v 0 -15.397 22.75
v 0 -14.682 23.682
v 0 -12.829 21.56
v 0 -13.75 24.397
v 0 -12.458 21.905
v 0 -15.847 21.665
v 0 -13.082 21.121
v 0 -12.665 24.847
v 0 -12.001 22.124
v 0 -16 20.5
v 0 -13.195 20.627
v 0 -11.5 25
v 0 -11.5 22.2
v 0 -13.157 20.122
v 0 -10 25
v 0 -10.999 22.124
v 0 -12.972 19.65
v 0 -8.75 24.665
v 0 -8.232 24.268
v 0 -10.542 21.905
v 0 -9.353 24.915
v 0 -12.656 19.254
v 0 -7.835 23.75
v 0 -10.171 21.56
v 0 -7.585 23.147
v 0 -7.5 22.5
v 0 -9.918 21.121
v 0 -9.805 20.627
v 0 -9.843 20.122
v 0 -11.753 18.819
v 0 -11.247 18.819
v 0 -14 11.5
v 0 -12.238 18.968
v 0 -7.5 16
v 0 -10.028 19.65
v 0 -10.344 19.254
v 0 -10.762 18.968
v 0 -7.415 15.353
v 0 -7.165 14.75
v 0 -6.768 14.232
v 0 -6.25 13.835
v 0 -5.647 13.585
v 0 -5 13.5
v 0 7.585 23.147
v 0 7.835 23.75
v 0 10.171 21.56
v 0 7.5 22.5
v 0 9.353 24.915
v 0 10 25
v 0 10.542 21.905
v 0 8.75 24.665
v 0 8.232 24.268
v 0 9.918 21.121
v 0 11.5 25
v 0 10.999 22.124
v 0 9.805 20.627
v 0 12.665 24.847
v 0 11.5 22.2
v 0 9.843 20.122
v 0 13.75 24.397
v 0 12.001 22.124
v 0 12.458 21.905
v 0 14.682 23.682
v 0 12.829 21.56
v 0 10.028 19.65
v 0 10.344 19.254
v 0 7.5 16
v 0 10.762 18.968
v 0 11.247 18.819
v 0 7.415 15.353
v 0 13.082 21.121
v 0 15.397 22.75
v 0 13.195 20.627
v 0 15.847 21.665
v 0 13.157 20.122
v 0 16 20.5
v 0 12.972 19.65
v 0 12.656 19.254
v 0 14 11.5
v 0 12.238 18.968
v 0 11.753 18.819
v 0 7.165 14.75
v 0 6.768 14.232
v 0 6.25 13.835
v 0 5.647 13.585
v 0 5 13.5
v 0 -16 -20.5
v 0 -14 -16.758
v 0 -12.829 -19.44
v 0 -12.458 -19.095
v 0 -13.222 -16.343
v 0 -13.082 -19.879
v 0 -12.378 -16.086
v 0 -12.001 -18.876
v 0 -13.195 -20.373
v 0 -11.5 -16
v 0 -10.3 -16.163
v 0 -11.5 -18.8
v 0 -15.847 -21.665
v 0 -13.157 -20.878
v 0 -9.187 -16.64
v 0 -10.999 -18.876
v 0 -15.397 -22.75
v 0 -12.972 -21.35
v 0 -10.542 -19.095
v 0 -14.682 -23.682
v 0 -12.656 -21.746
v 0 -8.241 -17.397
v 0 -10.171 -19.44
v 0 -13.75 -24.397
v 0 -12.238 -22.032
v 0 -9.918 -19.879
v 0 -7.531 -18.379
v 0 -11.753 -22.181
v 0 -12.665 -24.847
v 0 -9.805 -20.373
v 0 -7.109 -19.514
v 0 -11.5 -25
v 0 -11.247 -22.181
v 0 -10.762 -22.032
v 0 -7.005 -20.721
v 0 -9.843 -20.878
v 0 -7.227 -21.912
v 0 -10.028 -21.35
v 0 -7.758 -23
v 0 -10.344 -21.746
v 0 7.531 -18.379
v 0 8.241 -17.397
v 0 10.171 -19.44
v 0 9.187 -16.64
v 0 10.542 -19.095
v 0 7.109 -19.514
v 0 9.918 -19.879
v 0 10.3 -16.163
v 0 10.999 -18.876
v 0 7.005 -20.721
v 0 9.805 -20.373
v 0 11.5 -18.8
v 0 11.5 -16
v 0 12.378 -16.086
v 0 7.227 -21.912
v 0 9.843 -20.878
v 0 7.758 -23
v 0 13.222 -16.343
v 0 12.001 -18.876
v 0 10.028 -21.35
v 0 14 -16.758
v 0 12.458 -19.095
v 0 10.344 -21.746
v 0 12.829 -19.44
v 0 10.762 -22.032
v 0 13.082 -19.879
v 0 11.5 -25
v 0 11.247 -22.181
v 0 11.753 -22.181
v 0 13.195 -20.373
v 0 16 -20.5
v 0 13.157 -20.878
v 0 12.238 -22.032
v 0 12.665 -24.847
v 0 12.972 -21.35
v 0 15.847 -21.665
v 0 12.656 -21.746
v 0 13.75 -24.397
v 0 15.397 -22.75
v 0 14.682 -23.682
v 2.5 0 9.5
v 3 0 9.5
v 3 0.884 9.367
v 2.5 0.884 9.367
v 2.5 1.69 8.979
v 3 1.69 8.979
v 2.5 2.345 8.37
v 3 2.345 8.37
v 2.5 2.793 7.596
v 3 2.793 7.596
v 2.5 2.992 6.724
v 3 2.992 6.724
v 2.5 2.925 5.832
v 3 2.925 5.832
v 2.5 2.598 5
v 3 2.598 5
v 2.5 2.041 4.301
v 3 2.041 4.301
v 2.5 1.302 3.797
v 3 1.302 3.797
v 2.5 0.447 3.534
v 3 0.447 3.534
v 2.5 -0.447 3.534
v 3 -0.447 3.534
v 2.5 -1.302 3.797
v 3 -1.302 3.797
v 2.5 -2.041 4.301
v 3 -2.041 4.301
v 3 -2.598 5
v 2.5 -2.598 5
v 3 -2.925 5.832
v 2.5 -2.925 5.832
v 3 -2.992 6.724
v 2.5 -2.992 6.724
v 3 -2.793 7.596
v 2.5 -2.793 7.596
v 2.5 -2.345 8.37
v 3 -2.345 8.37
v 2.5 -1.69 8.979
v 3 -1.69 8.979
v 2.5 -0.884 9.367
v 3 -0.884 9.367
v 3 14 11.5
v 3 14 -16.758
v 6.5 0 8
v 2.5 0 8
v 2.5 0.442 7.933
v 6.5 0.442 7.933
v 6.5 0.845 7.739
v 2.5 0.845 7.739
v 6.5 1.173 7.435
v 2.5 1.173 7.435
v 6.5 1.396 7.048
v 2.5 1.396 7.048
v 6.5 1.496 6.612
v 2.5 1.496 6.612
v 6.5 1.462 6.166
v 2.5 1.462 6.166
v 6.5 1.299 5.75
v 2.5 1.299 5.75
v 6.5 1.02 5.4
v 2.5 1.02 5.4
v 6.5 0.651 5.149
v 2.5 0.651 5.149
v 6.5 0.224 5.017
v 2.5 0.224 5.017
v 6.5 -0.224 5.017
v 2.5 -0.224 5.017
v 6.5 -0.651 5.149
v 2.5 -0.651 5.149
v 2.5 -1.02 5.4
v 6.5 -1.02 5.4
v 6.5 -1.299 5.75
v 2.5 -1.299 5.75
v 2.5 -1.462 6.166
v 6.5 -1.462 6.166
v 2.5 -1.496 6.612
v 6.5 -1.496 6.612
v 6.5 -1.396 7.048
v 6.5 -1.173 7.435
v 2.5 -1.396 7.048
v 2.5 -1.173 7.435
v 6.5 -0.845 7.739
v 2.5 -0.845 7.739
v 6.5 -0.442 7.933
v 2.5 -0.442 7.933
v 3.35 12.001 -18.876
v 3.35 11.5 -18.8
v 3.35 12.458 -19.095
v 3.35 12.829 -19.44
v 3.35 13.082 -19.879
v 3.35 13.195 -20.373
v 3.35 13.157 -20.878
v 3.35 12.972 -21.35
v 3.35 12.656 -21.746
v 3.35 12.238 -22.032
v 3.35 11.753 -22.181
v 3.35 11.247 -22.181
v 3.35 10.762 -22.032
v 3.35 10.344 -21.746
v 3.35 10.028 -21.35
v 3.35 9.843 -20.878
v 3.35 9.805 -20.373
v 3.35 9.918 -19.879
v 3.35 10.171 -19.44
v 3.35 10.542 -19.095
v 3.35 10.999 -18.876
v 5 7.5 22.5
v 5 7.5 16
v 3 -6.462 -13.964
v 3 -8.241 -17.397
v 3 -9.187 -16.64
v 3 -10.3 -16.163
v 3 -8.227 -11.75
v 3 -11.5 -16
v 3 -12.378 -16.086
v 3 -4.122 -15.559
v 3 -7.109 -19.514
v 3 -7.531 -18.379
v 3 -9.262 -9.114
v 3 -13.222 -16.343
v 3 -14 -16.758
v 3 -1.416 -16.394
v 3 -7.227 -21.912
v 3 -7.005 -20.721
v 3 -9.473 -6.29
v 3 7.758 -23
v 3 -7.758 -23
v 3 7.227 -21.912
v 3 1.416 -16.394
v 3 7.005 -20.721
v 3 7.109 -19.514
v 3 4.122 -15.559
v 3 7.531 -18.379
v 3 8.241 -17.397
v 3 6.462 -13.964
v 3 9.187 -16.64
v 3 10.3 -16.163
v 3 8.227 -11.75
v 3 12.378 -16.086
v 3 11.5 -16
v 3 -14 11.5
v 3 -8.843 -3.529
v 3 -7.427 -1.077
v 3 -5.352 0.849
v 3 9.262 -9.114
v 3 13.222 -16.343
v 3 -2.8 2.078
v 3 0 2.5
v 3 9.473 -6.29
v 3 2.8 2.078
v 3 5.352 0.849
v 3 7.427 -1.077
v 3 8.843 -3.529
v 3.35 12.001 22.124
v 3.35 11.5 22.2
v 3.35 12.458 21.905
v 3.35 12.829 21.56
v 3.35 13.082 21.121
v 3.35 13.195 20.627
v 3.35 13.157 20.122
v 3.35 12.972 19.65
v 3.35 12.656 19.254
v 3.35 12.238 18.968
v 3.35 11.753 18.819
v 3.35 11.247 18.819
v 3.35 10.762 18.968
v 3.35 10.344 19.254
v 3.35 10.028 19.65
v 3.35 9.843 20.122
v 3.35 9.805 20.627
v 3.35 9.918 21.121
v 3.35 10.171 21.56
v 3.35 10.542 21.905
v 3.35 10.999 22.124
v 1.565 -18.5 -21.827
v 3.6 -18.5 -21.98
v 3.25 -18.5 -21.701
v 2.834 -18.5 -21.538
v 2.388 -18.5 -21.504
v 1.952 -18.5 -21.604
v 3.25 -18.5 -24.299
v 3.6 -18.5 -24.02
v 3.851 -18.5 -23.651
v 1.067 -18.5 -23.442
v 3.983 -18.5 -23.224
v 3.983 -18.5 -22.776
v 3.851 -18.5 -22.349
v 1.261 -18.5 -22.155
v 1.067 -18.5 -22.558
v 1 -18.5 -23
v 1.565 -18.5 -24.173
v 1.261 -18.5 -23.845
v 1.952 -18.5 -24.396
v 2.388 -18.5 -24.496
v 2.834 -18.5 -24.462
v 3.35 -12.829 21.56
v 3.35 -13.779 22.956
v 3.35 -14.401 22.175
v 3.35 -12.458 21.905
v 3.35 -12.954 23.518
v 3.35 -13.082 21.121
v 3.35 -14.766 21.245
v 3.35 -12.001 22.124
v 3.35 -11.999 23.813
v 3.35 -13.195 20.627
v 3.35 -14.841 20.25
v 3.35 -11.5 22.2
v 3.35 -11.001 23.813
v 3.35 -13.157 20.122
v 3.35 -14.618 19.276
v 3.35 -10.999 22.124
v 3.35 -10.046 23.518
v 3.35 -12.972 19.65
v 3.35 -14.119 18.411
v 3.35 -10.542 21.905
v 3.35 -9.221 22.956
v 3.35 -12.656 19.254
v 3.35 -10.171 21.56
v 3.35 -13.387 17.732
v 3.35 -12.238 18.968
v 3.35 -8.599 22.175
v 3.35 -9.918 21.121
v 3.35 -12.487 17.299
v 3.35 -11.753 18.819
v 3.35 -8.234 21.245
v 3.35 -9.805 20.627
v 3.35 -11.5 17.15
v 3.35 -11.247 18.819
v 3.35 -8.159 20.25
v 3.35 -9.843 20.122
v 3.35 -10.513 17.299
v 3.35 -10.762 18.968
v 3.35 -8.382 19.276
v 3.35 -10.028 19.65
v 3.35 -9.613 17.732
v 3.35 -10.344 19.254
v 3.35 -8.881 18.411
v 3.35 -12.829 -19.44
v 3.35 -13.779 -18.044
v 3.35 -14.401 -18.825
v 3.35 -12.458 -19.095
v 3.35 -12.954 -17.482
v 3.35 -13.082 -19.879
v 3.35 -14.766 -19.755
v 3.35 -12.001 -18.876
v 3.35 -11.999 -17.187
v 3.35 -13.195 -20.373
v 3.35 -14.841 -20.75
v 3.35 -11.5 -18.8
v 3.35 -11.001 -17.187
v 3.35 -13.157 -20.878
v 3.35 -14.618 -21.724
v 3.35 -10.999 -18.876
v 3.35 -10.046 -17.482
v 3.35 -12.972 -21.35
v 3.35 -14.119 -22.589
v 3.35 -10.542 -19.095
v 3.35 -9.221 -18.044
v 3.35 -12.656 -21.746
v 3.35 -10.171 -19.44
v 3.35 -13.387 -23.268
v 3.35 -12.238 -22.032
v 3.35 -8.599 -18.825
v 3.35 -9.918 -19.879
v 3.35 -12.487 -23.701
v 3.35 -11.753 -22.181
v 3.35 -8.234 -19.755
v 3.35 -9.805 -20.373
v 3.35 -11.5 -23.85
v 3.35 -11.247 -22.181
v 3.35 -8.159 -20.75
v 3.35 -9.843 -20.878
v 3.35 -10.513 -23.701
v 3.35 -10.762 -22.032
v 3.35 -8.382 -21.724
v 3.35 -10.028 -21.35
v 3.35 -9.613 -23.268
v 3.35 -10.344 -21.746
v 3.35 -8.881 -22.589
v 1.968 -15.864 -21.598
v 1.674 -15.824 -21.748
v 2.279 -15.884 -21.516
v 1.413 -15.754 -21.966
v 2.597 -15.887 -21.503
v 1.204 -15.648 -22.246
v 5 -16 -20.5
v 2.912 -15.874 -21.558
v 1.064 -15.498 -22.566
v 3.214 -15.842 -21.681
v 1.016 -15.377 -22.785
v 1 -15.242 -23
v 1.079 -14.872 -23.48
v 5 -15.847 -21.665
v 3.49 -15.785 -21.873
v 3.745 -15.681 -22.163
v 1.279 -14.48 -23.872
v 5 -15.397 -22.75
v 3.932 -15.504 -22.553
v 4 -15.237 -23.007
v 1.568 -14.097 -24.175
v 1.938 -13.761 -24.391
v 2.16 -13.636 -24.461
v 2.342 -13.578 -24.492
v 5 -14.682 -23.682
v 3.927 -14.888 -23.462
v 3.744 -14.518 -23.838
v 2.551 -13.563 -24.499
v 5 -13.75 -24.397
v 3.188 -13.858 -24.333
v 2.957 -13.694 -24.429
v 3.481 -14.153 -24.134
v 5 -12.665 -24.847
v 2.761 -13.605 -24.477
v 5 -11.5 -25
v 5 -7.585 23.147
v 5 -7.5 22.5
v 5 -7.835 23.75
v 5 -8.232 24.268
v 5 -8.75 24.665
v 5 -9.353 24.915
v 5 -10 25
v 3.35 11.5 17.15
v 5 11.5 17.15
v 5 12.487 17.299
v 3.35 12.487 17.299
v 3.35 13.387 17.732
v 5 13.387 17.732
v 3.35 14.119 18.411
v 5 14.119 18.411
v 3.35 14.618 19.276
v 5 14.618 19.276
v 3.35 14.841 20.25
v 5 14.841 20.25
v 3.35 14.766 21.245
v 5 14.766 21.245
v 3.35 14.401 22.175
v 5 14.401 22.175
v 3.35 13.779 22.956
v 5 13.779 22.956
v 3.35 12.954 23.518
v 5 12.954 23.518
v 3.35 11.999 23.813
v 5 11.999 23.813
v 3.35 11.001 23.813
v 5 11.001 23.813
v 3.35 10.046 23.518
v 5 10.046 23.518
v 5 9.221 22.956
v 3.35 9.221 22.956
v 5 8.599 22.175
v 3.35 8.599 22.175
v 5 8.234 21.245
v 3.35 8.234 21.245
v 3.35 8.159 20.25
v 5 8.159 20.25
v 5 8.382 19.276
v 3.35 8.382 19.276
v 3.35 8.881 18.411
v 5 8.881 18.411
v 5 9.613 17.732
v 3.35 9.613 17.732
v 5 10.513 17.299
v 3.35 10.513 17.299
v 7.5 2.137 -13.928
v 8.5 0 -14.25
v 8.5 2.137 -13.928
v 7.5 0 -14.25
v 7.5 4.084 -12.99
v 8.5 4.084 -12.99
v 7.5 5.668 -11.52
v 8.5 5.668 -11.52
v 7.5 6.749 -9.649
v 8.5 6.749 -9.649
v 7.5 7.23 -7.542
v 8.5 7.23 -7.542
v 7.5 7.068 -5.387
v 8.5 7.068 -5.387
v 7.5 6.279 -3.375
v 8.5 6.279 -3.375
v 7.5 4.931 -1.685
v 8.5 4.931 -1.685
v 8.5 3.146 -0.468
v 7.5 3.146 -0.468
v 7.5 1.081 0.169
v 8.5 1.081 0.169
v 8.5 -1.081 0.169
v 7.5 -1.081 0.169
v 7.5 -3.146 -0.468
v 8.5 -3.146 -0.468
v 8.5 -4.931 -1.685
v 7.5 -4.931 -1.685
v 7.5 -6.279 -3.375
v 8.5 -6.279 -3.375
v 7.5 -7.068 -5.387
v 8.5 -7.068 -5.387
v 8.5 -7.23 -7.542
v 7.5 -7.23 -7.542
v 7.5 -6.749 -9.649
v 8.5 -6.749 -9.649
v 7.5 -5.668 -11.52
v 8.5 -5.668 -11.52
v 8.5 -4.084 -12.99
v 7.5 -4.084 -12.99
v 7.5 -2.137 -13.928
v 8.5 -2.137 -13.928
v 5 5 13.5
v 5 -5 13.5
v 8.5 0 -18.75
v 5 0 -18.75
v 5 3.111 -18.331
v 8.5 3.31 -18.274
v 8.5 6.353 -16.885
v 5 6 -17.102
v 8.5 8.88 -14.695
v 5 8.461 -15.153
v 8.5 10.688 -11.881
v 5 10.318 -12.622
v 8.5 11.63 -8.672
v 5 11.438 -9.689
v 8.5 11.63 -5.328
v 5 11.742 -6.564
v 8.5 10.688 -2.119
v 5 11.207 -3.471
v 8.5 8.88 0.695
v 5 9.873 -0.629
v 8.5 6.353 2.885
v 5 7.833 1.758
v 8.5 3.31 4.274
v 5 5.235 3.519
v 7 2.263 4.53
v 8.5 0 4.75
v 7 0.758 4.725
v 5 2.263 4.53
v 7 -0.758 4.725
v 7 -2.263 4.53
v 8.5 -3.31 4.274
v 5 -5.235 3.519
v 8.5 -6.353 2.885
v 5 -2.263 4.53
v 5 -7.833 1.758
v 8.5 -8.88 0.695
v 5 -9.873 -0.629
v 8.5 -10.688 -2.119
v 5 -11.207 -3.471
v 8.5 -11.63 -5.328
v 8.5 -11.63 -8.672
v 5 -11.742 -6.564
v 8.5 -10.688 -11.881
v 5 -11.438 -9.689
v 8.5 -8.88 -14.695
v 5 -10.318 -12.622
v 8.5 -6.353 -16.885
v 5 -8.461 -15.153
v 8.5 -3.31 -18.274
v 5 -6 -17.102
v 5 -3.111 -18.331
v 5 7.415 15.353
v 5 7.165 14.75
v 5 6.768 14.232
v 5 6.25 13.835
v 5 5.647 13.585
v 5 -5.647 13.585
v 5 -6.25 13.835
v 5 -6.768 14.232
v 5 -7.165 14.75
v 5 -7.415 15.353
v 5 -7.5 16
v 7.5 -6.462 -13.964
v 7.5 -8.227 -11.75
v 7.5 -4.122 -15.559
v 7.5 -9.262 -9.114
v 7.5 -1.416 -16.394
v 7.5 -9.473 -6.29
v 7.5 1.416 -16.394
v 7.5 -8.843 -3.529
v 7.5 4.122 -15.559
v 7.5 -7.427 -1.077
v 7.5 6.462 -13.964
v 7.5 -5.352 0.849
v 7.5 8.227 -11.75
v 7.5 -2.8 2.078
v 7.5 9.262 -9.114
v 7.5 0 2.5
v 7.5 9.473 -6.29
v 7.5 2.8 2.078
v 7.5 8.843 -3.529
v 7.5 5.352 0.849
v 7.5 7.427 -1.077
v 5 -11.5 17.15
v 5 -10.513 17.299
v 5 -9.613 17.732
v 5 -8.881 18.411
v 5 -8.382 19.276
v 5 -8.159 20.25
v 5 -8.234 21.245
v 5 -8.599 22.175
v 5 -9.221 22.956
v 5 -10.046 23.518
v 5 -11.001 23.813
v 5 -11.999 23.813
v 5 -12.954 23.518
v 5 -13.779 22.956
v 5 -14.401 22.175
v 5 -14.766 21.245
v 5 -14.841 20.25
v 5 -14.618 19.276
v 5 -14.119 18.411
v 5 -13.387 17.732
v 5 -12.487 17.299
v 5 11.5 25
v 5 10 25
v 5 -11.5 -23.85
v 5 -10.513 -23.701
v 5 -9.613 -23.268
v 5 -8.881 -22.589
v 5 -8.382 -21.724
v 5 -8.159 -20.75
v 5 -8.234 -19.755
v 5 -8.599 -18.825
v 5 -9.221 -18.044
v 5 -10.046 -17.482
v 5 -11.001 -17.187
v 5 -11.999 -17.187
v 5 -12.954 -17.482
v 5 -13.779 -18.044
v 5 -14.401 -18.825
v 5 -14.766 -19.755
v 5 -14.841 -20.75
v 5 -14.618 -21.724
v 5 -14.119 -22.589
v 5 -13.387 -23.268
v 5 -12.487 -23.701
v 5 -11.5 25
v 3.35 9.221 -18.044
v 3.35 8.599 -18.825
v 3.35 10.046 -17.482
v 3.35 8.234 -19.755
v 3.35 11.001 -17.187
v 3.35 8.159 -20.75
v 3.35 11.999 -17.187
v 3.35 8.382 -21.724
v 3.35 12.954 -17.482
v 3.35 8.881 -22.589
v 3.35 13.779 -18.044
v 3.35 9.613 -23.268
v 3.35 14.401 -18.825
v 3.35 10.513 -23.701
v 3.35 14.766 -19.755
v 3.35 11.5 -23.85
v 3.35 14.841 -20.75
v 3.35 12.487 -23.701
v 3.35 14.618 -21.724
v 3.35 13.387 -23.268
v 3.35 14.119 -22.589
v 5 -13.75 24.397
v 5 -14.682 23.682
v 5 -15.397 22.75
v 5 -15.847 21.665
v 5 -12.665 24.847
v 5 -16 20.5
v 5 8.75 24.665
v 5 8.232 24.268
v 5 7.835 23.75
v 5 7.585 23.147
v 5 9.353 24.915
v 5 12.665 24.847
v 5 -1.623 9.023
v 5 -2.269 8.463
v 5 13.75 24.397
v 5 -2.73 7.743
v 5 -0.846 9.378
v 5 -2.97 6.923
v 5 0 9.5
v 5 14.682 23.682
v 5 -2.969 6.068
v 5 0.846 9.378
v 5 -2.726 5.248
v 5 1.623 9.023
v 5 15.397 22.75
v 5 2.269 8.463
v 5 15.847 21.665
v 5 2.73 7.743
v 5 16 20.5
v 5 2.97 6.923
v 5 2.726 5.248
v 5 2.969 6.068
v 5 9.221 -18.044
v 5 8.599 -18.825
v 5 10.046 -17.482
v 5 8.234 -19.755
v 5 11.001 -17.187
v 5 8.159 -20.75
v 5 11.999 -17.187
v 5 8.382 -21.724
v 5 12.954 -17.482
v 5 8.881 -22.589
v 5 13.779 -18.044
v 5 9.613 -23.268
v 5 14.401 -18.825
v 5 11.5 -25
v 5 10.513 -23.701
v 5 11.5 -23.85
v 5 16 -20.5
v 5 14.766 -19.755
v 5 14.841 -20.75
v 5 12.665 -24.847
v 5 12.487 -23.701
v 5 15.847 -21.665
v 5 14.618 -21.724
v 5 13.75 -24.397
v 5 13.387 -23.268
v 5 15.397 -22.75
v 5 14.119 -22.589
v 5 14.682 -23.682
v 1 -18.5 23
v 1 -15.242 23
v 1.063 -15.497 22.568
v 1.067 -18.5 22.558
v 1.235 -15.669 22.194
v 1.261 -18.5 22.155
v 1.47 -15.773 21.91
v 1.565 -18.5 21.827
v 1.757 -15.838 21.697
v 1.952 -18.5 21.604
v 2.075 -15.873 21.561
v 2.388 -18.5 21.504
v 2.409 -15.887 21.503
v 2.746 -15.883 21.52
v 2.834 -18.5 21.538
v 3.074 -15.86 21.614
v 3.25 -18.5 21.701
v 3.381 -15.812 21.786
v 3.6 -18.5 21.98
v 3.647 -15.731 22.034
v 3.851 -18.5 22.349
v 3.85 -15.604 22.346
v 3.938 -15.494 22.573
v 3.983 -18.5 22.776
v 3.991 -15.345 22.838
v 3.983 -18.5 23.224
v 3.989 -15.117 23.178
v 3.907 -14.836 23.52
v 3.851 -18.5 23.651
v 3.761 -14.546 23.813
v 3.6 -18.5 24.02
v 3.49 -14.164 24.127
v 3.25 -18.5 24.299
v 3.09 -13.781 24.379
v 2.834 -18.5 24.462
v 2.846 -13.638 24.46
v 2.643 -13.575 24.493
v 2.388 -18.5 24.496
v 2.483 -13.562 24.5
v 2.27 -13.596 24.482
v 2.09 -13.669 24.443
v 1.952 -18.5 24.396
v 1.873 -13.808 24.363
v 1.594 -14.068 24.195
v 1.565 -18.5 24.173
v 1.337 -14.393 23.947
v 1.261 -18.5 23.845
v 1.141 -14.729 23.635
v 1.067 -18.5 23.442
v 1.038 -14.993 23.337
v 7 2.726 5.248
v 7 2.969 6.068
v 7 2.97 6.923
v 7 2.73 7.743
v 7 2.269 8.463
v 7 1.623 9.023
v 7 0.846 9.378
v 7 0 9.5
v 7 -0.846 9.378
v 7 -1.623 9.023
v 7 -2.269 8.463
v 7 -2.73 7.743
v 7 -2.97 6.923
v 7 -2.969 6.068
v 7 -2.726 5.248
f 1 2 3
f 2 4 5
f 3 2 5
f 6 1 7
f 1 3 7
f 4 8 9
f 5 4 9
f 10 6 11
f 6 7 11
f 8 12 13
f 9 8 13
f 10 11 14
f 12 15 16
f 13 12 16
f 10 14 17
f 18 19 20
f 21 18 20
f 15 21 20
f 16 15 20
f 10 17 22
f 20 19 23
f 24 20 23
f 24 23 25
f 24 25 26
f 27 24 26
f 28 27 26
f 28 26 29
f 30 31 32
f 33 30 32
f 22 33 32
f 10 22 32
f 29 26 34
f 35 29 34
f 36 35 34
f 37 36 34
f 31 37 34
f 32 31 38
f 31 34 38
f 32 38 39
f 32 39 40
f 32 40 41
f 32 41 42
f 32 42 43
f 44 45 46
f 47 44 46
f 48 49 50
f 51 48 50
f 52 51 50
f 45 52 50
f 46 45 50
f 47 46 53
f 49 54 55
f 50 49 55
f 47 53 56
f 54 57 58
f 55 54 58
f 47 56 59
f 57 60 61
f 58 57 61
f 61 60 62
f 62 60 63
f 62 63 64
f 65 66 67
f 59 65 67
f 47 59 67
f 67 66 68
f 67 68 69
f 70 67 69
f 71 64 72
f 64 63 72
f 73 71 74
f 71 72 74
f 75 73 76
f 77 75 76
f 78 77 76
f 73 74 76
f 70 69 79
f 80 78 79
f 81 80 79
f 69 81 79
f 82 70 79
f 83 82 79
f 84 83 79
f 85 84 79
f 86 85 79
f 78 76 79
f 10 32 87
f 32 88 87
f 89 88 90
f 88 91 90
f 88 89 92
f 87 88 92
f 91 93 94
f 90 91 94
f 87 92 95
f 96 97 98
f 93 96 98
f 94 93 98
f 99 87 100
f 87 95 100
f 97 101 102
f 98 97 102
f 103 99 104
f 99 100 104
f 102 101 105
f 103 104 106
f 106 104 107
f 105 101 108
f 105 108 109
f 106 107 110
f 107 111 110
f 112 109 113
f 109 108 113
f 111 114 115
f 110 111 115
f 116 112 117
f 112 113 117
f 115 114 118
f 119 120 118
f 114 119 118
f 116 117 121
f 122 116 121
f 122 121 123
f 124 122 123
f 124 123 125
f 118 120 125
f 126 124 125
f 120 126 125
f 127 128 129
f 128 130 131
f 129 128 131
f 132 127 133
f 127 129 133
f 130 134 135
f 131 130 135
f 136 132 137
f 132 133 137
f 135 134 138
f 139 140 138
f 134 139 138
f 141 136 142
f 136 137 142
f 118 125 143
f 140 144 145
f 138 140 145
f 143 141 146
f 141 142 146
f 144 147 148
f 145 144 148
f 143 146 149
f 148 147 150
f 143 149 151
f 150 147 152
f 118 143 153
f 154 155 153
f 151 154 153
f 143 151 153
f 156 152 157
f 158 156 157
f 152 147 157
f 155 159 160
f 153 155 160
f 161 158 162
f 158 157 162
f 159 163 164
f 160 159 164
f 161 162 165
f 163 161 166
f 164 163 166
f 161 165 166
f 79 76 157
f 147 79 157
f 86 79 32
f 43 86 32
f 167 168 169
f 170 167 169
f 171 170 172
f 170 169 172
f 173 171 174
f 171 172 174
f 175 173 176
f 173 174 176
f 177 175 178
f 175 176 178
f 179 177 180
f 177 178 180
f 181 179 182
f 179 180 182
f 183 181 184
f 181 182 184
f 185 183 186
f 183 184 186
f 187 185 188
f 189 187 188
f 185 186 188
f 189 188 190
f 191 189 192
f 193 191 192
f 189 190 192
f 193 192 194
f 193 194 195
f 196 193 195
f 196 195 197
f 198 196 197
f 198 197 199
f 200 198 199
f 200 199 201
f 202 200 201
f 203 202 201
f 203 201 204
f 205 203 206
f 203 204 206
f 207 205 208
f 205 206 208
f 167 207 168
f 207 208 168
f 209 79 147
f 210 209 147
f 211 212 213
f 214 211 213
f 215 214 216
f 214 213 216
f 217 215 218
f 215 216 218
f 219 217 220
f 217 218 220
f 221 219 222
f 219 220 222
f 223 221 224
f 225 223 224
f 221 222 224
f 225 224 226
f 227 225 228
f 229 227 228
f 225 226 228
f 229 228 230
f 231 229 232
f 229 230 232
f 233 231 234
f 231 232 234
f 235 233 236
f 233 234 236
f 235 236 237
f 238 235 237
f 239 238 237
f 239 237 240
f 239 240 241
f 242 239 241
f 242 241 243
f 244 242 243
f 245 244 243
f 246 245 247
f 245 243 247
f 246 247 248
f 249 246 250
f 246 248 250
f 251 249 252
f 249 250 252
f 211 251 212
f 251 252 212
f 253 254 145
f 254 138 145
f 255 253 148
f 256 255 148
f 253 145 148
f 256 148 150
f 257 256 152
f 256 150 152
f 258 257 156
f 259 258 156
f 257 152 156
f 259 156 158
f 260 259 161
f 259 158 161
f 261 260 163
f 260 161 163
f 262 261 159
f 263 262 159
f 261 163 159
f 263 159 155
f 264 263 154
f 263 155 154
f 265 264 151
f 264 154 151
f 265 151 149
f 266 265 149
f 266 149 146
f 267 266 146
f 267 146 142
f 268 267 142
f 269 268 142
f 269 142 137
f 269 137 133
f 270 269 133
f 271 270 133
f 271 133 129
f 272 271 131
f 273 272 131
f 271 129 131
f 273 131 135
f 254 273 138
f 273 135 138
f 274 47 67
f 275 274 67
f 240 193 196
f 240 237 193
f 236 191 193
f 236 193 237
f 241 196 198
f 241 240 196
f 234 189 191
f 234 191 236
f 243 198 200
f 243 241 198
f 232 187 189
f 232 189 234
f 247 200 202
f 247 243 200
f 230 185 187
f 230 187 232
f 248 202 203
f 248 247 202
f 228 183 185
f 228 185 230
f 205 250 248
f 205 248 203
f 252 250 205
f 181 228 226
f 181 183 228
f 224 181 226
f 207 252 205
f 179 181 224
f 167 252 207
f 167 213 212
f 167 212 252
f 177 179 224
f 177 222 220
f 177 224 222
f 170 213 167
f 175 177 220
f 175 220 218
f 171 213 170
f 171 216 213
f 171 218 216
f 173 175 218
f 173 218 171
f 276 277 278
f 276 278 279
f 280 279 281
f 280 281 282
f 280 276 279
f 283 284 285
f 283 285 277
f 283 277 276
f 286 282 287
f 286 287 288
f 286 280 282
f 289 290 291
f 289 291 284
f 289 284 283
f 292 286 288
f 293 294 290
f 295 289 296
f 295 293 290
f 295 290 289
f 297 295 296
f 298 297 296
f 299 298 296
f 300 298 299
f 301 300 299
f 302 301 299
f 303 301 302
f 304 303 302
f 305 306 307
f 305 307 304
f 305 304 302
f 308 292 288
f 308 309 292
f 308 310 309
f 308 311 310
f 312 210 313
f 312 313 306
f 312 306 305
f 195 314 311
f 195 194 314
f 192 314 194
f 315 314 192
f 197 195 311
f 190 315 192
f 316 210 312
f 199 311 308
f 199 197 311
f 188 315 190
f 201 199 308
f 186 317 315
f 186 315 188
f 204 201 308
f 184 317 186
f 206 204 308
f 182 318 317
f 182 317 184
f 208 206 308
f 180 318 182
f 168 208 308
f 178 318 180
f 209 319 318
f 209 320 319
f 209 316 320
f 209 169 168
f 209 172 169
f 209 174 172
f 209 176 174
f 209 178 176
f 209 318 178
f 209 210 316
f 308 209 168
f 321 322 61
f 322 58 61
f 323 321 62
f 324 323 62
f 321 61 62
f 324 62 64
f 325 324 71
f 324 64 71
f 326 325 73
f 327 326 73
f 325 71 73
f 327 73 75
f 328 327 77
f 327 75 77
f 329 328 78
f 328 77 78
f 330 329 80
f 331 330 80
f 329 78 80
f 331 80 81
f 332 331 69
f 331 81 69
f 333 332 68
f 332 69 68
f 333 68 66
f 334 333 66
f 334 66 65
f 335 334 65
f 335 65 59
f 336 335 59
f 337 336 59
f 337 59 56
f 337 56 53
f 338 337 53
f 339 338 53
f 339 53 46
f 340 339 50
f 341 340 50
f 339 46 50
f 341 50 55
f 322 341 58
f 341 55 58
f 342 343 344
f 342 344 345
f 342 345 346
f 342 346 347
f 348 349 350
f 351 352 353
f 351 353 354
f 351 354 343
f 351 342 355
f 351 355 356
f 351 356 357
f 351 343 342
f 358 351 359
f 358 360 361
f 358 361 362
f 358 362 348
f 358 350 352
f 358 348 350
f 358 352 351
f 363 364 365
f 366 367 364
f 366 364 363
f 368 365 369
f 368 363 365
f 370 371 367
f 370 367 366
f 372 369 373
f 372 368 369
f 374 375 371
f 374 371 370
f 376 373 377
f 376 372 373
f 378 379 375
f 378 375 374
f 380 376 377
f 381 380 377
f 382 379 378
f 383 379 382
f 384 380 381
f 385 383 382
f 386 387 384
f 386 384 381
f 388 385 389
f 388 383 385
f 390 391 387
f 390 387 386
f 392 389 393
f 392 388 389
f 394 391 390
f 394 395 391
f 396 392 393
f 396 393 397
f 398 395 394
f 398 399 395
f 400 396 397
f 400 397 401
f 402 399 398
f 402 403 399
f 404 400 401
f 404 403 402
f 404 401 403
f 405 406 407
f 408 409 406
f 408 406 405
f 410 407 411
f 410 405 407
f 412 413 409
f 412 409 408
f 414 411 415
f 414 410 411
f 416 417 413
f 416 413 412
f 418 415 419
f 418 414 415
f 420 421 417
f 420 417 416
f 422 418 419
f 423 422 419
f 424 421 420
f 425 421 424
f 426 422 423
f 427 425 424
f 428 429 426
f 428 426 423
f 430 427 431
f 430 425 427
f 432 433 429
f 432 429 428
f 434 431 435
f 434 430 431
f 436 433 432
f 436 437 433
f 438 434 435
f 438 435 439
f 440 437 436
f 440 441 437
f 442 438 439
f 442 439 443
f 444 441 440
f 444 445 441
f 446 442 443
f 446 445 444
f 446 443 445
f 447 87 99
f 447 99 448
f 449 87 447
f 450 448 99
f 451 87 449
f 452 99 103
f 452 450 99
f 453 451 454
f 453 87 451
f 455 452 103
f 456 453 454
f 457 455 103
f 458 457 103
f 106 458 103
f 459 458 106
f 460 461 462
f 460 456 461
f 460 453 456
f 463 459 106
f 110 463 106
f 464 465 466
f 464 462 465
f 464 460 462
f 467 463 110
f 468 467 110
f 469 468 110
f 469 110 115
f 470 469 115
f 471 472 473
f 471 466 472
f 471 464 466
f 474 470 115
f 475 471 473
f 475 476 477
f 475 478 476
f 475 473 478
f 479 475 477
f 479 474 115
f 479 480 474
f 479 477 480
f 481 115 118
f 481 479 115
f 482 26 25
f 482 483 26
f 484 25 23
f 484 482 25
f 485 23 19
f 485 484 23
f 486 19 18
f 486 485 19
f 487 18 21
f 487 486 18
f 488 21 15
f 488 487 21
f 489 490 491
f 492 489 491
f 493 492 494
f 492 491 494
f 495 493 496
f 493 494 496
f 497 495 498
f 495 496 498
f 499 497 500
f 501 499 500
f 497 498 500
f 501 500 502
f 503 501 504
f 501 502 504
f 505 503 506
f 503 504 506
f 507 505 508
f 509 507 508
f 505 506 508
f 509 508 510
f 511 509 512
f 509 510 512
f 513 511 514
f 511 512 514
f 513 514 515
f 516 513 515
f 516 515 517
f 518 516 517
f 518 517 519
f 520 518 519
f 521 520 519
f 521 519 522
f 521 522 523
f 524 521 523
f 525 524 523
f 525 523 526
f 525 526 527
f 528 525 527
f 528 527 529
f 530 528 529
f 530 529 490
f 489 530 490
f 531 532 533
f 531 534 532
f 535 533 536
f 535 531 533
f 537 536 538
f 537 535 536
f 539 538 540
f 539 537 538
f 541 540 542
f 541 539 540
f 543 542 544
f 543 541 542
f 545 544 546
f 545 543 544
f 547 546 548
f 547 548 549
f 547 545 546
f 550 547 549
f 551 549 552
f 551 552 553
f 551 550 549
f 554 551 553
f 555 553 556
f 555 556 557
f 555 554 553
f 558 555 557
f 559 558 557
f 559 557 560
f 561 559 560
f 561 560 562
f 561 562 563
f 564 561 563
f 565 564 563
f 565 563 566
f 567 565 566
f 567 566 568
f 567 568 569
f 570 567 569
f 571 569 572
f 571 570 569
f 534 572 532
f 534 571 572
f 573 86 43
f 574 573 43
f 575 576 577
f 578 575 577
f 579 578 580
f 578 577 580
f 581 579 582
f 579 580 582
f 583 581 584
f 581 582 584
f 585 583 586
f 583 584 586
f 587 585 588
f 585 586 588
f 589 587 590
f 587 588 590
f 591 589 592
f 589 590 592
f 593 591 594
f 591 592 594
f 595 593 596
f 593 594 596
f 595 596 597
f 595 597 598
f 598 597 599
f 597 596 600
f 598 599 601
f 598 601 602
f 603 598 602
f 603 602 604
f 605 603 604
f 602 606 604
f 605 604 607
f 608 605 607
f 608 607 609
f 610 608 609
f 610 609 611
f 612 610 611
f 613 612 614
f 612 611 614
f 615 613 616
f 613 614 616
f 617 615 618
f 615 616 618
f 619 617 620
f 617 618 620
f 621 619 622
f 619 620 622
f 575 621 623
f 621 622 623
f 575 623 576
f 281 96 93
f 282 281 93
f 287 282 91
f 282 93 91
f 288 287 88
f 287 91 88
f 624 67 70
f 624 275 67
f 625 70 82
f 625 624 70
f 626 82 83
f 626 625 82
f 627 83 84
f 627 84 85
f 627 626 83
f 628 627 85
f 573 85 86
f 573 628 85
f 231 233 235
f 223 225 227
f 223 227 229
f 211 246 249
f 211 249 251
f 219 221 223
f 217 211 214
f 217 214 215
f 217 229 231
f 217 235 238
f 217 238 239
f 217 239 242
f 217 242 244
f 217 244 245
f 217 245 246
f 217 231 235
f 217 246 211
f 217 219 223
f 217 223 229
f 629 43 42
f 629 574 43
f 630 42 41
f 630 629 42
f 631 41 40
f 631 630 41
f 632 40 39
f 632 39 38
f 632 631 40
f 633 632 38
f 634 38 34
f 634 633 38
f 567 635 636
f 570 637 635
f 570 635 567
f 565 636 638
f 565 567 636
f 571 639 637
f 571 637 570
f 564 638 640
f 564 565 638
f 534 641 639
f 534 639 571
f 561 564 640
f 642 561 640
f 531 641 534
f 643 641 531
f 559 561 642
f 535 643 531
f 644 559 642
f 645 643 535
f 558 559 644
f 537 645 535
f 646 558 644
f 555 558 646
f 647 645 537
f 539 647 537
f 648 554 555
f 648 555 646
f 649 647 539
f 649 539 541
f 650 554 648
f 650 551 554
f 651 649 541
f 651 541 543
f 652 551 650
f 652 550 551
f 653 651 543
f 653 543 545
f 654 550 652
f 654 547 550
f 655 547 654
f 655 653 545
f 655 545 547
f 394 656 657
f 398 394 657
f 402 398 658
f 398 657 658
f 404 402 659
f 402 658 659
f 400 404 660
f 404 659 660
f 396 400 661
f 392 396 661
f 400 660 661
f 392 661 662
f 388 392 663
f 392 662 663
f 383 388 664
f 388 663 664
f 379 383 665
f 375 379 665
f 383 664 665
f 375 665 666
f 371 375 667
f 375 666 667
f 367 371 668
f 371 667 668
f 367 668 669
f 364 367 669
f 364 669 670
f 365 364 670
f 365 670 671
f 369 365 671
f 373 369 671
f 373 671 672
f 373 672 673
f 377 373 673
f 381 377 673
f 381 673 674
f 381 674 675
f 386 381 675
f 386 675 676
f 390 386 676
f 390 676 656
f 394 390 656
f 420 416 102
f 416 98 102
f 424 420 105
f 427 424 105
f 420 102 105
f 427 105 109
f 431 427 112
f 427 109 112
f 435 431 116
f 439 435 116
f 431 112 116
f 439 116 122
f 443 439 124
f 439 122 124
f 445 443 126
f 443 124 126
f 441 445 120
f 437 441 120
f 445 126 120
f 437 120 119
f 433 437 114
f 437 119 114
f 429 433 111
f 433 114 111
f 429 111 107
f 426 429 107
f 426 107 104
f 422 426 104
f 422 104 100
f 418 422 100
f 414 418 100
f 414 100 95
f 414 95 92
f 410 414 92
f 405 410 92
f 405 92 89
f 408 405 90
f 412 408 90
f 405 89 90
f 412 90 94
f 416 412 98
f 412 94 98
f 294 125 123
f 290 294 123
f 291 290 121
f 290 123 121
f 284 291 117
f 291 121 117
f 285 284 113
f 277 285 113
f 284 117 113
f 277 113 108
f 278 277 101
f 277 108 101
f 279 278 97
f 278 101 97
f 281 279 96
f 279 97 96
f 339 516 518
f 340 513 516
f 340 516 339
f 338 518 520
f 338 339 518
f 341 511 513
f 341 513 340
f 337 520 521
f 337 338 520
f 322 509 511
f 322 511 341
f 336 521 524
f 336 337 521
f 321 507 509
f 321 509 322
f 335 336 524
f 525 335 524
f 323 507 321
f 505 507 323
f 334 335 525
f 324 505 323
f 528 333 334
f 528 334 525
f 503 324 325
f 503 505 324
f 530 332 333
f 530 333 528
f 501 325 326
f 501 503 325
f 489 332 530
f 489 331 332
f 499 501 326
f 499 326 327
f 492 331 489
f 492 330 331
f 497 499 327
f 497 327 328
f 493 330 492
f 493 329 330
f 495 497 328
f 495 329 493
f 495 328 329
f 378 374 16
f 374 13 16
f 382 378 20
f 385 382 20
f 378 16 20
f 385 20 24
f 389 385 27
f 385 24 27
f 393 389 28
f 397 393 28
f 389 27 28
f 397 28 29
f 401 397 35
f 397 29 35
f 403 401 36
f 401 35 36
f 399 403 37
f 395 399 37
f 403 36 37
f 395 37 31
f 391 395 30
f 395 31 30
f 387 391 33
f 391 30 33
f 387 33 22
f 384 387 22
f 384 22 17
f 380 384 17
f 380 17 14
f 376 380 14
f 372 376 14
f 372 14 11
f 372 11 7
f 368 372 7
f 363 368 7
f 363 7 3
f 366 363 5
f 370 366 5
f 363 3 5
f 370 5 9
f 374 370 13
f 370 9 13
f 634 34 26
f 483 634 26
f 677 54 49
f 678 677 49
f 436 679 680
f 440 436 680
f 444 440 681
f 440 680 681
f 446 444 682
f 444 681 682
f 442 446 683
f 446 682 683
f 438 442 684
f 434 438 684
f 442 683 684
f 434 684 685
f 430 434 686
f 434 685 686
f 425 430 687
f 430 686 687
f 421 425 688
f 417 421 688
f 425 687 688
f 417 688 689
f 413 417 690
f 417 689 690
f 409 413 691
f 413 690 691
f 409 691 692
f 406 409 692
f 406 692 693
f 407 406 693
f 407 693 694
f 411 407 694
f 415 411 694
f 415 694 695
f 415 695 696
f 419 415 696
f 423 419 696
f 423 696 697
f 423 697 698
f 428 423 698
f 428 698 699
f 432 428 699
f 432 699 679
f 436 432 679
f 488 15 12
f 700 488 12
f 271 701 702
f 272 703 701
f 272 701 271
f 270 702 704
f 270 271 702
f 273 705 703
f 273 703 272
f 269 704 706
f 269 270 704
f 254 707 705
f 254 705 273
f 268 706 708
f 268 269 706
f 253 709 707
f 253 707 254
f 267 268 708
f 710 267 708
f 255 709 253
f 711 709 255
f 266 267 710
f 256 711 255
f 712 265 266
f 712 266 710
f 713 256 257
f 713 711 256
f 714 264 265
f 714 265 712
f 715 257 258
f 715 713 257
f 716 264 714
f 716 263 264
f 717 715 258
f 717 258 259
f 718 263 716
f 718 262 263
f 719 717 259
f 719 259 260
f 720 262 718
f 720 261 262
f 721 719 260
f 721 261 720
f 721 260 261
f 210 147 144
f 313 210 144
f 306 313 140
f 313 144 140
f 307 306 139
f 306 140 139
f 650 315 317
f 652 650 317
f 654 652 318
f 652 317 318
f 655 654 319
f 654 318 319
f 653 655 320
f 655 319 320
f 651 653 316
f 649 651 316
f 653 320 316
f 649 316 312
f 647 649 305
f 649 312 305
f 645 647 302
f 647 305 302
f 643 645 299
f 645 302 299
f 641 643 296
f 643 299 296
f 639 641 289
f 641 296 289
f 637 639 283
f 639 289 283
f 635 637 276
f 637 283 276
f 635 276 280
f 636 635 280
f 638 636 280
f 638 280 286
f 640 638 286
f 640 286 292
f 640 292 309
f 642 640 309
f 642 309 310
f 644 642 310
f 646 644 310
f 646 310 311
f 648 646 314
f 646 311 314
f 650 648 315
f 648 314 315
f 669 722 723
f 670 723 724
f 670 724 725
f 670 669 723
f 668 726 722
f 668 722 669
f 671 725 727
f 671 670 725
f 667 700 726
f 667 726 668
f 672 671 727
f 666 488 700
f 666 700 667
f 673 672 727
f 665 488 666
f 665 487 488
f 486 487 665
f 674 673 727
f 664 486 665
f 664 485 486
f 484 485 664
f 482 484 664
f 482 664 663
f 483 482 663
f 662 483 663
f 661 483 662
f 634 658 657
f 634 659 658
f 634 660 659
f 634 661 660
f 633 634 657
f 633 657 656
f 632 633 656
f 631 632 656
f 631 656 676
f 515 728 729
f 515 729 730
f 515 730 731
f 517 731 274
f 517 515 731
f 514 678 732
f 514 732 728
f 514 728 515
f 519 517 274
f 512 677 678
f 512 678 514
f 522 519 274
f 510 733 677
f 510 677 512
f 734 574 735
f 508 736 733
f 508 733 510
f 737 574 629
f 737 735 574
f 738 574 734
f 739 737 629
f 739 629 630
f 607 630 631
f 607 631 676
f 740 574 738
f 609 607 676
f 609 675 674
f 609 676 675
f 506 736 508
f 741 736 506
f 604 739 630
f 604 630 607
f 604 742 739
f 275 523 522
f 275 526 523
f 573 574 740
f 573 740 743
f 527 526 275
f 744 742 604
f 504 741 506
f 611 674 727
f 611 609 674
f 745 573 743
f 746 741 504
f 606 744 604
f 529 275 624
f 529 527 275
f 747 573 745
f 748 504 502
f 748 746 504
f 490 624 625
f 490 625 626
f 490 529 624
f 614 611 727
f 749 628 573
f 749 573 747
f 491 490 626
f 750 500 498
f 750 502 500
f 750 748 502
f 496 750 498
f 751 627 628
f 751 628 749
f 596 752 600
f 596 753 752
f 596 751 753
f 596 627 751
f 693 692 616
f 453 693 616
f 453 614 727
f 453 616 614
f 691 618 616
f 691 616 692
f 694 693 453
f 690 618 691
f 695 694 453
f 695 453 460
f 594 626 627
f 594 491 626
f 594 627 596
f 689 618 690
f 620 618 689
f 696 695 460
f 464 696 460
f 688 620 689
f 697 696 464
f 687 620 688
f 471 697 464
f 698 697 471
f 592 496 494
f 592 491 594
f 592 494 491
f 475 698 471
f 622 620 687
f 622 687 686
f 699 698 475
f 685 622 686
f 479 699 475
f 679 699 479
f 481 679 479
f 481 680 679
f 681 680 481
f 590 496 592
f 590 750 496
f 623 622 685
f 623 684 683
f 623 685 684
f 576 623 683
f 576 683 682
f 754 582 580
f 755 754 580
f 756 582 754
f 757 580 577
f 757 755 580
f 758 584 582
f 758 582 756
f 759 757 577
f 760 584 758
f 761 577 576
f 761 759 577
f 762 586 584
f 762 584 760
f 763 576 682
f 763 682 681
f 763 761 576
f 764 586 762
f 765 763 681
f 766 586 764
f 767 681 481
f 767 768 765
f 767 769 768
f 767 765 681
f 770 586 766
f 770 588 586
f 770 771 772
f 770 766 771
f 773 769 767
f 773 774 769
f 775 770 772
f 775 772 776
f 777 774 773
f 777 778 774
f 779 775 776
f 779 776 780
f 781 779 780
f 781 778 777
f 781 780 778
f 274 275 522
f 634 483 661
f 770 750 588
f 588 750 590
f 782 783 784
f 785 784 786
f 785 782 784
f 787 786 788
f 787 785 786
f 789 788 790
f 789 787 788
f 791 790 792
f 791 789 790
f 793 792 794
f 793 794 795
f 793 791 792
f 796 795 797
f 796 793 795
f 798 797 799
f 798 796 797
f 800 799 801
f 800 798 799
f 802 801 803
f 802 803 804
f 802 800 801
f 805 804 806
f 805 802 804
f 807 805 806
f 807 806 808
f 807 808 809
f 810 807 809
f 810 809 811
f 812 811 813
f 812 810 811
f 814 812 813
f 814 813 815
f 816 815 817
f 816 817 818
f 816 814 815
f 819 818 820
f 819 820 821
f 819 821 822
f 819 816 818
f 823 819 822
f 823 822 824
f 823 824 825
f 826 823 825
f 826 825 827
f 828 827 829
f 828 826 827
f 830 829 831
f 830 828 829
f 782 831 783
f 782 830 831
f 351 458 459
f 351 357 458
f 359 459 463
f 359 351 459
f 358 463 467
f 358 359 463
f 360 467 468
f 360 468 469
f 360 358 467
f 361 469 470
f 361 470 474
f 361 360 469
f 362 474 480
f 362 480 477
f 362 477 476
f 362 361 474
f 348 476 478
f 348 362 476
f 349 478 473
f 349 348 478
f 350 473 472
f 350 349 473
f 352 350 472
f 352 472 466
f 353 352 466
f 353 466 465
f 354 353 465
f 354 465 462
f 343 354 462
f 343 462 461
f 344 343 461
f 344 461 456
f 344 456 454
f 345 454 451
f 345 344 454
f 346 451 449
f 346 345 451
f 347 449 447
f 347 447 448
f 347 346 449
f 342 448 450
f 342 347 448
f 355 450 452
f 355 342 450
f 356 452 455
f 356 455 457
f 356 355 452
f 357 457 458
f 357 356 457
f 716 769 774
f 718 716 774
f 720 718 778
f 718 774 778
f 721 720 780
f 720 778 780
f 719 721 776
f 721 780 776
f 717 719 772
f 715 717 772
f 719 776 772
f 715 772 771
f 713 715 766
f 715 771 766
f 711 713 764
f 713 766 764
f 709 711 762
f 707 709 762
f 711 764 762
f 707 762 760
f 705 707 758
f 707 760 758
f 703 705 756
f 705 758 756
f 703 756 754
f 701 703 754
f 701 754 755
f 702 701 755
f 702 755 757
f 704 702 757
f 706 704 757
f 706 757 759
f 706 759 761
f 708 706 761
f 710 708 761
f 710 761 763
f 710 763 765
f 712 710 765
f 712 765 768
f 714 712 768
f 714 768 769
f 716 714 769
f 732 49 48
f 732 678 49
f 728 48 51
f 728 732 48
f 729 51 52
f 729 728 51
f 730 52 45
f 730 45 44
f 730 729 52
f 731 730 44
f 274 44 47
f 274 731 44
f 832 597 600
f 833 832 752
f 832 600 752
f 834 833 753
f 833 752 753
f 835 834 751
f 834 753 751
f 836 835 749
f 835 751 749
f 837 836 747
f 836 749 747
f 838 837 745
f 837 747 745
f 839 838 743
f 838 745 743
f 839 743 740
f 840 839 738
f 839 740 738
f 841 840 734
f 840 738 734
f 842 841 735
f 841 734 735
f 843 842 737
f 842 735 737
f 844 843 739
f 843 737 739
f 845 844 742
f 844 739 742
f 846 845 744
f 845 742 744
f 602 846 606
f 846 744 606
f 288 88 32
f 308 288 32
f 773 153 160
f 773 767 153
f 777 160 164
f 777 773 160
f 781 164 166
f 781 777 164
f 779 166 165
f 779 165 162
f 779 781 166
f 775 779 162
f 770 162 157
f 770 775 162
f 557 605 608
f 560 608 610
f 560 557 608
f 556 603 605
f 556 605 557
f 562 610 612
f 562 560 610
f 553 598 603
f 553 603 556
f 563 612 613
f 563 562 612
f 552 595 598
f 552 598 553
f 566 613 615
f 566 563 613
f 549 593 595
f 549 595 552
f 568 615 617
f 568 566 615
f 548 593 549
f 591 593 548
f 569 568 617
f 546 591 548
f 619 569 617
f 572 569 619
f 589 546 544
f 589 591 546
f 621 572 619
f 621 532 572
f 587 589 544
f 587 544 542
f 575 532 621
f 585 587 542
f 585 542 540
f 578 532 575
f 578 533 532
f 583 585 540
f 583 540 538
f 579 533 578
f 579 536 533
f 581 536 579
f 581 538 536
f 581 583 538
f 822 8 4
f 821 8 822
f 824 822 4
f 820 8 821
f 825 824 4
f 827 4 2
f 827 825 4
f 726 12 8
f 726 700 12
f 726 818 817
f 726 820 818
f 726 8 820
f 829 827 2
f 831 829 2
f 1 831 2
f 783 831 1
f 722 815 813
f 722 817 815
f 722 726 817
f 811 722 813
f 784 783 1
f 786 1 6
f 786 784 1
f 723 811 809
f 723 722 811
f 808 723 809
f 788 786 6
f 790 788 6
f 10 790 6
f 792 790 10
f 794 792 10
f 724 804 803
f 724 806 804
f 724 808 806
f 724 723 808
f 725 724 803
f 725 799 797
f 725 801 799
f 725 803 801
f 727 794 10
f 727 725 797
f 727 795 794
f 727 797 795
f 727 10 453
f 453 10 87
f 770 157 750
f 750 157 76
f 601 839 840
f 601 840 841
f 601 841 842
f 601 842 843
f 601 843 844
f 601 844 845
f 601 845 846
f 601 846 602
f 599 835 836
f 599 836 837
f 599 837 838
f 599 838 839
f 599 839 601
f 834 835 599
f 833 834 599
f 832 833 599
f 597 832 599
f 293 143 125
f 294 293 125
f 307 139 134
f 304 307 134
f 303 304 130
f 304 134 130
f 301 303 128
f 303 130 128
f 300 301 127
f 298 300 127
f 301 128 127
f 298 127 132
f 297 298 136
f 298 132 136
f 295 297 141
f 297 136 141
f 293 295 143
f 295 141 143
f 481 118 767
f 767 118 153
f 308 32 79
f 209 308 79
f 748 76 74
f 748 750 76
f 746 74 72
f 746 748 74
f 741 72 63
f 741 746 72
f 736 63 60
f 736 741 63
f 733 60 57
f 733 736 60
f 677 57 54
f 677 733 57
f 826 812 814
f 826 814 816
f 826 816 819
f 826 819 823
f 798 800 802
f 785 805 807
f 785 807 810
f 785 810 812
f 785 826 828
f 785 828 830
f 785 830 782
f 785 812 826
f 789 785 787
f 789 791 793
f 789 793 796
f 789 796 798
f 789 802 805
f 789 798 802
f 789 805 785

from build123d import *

# Parameters (mm, degrees)
SKETCH1_R                       = 7.25
BOSS_EXTRUDE1_DEPTH             = 5
SKETCH2_R                       = 11.75
SKETCH2_R_2                     = 7.25
BOSS_EXTRUDE2_DEPTH             = 3.5
FILLET1_R                       = 4.5
FILLET2_R                       = 2.5
SKETCH3_R                       = 1.5
BOSS_EXTRUDE3_DEPTH             = 2.5
BOSS_EXTRUDE3_DIRECTION_2_REACH = 34
CBORE_FOR_M3_SBHCS1_D           = 3.4
CBORE_FOR_M3_SBHCS1_CBORE_D     = 6.7
CBORE_FOR_M3_SBHCS1_CBORE_DEPTH = 1.65
SKETCH6_R                       = 7.25
CUT_EXTRUDE1_DEPTH              = 3
SKETCH7_R                       = 9.5
CUT_EXTRUDE2_DEPTH              = 4.5
SKETCH10_R                      = 3
BOSS_EXTRUDE5_DEPTH             = 2
SKETCH11_R                      = 3
BOSS_EXTRUDE6_DEPTH             = 0.5
SKETCH12_R                      = 1.5
CUT_EXTRUDE4_DEPTH              = 4


with BuildPart() as part:
    # Sketch1 → Boss-Extrude1 (new body)
    with BuildSketch(Plane(origin=(0, 0, 0), x_dir=(0, 0, -1), z_dir=(1, 0, 0))):
        Polygon((-25, 16), (-25, 7.5), (-13.5, 7.5), (-13.5, -7.5), (-25, -7.5), (-25, -16), (25, -16), (25, 16), align=None)
        with Locations((7, 0)):
            Circle(SKETCH1_R, mode=Mode.SUBTRACT)
    extrude(amount=BOSS_EXTRUDE1_DEPTH)

    # Sketch2 → Boss-Extrude2 (add)
    with BuildSketch(Plane(origin=(5, 0, 0), x_dir=(0, 0, -1), z_dir=(1, 0, 0))):
        with Locations((7, 0)):
            Circle(SKETCH2_R)
        with Locations((7, 0)):
            Circle(SKETCH2_R_2, mode=Mode.SUBTRACT)
    extrude(amount=BOSS_EXTRUDE2_DEPTH)

    # Fillet1
    fillet1_edges = [part.edges().sort_by_distance(p)[0] for p in [
        (2.5, 16, 25),
        (2.5, 16, -25),
        (2.5, -16, -25),
        (2.5, -16, 25),
    ]]
    fillet(fillet1_edges, radius=FILLET1_R)

    # Fillet2
    fillet2_edges = [part.edges().sort_by_distance(p)[0] for p in [
        (2.5, 7.5, 13.5),
        (2.5, 7.5, 25),
        (2.5, -7.5, 25),
        (2.5, -7.5, 13.5),
    ]]
    fillet(fillet2_edges, radius=FILLET2_R)

    # Sketch3 → Boss-Extrude3 (add)
    with BuildSketch(Plane(origin=(0, -16, 0), x_dir=(-1, 0, 0), z_dir=(0, -1, 0))):
        with Locations((-2.5, -23)):
            Circle(SKETCH3_R)
        with Locations((-2.5, 23)):
            Circle(SKETCH3_R)
    extrude(amount=BOSS_EXTRUDE3_DEPTH)

    # Sketch3 → Boss-Extrude3 direction 2 (add, up to next)
    with BuildSketch(Plane(origin=(0, -16, 0), x_dir=(-1, 0, 0), z_dir=(0, -1, 0)), mode=Mode.PRIVATE) as boss_extrude3_direction_2_sk1:
        with Locations((-2.5, -23)):
            Circle(SKETCH3_R)
    boss_extrude3_direction_2_tool1 = extrude(boss_extrude3_direction_2_sk1.sketch, amount=-BOSS_EXTRUDE3_DIRECTION_2_REACH, mode=Mode.PRIVATE) - part.part
    add(boss_extrude3_direction_2_tool1.solids().sort_by_distance((2.5, -16, 23))[0])
    # Sketch3 → Boss-Extrude3 direction 2 (add, up to next)
    with BuildSketch(Plane(origin=(0, -16, 0), x_dir=(-1, 0, 0), z_dir=(0, -1, 0)), mode=Mode.PRIVATE) as boss_extrude3_direction_2_sk2:
        with Locations((-2.5, 23)):
            Circle(SKETCH3_R)
    boss_extrude3_direction_2_tool2 = extrude(boss_extrude3_direction_2_sk2.sketch, amount=-BOSS_EXTRUDE3_DIRECTION_2_REACH, mode=Mode.PRIVATE) - part.part
    add(boss_extrude3_direction_2_tool2.solids().sort_by_distance((2.5, -16, -23))[0])

    # CBORE for M3 SBHCS1 (through all)
    with Locations(Plane(origin=(5, 0, 0), x_dir=(0, 0, -1), z_dir=(1, 0, 0))):
        with Locations((-20.5, 11.5), (-20.5, -11.5), (20.5, 11.5), (20.5, -11.5)):
            CounterBoreHole(CBORE_FOR_M3_SBHCS1_D / 2, CBORE_FOR_M3_SBHCS1_CBORE_D / 2, CBORE_FOR_M3_SBHCS1_CBORE_DEPTH)

    # Sketch6 → Cut-Extrude1 (cut)
    with BuildSketch(Plane.ZY):
        with BuildLine():
            Line((11.5, 5), (11.5, 14))
            Line((11.5, 14), (-16.758342613, 14))
            ThreePointArc((-16.758342613, 14), (-16.19375696, 12.80624304), (-16, 11.5))
            ThreePointArc((-16, 11.5), (-18.378679656, 7.531373033), (-23, 7.758342613))
            Line((-23, 7.758342613), (-23, -7.758342613))
            ThreePointArc((-23, -7.758342613), (-18.378679656, -7.531373033), (-16, -11.5))
            ThreePointArc((-16, -11.5), (-16.19375696, -12.80624304), (-16.758342613, -14))
            Line((-16.758342613, -14), (11.5, -14))
            Line((11.5, -14), (11.5, -5))
            Line((11.5, -5), (11.5, 5))
        make_face()
        with Locations((-7, 0)):
            Circle(SKETCH6_R, mode=Mode.SUBTRACT)
    extrude(amount=-CUT_EXTRUDE1_DEPTH, mode=Mode.SUBTRACT)

    # Sketch7 → Cut-Extrude2 (cut)
    with BuildSketch(Plane.ZY.offset(-3)):
        with Locations((-7, 0)):
            Circle(SKETCH7_R)
    extrude(amount=-CUT_EXTRUDE2_DEPTH, mode=Mode.SUBTRACT)

    # Sketch10 → Boss-Extrude5 (add)
    with BuildSketch(Plane(origin=(5, 0, 0), x_dir=(0, 0, -1), z_dir=(1, 0, 0))):
        with Locations((-6.5, 0)):
            Circle(SKETCH10_R)
    extrude(amount=BOSS_EXTRUDE5_DEPTH)

    # Sketch11 → Boss-Extrude6 (add)
    with BuildSketch(Plane.ZY.offset(-3)):
        with Locations((6.5, 0)):
            Circle(SKETCH11_R)
    extrude(amount=BOSS_EXTRUDE6_DEPTH)

    # Sketch12 → Cut-Extrude4 (cut)
    with BuildSketch(Plane.ZY.offset(-2.5)):
        with Locations((6.5, 0)):
            Circle(SKETCH12_R)
    extrude(amount=-CUT_EXTRUDE4_DEPTH, mode=Mode.SUBTRACT)


solid = part.part
